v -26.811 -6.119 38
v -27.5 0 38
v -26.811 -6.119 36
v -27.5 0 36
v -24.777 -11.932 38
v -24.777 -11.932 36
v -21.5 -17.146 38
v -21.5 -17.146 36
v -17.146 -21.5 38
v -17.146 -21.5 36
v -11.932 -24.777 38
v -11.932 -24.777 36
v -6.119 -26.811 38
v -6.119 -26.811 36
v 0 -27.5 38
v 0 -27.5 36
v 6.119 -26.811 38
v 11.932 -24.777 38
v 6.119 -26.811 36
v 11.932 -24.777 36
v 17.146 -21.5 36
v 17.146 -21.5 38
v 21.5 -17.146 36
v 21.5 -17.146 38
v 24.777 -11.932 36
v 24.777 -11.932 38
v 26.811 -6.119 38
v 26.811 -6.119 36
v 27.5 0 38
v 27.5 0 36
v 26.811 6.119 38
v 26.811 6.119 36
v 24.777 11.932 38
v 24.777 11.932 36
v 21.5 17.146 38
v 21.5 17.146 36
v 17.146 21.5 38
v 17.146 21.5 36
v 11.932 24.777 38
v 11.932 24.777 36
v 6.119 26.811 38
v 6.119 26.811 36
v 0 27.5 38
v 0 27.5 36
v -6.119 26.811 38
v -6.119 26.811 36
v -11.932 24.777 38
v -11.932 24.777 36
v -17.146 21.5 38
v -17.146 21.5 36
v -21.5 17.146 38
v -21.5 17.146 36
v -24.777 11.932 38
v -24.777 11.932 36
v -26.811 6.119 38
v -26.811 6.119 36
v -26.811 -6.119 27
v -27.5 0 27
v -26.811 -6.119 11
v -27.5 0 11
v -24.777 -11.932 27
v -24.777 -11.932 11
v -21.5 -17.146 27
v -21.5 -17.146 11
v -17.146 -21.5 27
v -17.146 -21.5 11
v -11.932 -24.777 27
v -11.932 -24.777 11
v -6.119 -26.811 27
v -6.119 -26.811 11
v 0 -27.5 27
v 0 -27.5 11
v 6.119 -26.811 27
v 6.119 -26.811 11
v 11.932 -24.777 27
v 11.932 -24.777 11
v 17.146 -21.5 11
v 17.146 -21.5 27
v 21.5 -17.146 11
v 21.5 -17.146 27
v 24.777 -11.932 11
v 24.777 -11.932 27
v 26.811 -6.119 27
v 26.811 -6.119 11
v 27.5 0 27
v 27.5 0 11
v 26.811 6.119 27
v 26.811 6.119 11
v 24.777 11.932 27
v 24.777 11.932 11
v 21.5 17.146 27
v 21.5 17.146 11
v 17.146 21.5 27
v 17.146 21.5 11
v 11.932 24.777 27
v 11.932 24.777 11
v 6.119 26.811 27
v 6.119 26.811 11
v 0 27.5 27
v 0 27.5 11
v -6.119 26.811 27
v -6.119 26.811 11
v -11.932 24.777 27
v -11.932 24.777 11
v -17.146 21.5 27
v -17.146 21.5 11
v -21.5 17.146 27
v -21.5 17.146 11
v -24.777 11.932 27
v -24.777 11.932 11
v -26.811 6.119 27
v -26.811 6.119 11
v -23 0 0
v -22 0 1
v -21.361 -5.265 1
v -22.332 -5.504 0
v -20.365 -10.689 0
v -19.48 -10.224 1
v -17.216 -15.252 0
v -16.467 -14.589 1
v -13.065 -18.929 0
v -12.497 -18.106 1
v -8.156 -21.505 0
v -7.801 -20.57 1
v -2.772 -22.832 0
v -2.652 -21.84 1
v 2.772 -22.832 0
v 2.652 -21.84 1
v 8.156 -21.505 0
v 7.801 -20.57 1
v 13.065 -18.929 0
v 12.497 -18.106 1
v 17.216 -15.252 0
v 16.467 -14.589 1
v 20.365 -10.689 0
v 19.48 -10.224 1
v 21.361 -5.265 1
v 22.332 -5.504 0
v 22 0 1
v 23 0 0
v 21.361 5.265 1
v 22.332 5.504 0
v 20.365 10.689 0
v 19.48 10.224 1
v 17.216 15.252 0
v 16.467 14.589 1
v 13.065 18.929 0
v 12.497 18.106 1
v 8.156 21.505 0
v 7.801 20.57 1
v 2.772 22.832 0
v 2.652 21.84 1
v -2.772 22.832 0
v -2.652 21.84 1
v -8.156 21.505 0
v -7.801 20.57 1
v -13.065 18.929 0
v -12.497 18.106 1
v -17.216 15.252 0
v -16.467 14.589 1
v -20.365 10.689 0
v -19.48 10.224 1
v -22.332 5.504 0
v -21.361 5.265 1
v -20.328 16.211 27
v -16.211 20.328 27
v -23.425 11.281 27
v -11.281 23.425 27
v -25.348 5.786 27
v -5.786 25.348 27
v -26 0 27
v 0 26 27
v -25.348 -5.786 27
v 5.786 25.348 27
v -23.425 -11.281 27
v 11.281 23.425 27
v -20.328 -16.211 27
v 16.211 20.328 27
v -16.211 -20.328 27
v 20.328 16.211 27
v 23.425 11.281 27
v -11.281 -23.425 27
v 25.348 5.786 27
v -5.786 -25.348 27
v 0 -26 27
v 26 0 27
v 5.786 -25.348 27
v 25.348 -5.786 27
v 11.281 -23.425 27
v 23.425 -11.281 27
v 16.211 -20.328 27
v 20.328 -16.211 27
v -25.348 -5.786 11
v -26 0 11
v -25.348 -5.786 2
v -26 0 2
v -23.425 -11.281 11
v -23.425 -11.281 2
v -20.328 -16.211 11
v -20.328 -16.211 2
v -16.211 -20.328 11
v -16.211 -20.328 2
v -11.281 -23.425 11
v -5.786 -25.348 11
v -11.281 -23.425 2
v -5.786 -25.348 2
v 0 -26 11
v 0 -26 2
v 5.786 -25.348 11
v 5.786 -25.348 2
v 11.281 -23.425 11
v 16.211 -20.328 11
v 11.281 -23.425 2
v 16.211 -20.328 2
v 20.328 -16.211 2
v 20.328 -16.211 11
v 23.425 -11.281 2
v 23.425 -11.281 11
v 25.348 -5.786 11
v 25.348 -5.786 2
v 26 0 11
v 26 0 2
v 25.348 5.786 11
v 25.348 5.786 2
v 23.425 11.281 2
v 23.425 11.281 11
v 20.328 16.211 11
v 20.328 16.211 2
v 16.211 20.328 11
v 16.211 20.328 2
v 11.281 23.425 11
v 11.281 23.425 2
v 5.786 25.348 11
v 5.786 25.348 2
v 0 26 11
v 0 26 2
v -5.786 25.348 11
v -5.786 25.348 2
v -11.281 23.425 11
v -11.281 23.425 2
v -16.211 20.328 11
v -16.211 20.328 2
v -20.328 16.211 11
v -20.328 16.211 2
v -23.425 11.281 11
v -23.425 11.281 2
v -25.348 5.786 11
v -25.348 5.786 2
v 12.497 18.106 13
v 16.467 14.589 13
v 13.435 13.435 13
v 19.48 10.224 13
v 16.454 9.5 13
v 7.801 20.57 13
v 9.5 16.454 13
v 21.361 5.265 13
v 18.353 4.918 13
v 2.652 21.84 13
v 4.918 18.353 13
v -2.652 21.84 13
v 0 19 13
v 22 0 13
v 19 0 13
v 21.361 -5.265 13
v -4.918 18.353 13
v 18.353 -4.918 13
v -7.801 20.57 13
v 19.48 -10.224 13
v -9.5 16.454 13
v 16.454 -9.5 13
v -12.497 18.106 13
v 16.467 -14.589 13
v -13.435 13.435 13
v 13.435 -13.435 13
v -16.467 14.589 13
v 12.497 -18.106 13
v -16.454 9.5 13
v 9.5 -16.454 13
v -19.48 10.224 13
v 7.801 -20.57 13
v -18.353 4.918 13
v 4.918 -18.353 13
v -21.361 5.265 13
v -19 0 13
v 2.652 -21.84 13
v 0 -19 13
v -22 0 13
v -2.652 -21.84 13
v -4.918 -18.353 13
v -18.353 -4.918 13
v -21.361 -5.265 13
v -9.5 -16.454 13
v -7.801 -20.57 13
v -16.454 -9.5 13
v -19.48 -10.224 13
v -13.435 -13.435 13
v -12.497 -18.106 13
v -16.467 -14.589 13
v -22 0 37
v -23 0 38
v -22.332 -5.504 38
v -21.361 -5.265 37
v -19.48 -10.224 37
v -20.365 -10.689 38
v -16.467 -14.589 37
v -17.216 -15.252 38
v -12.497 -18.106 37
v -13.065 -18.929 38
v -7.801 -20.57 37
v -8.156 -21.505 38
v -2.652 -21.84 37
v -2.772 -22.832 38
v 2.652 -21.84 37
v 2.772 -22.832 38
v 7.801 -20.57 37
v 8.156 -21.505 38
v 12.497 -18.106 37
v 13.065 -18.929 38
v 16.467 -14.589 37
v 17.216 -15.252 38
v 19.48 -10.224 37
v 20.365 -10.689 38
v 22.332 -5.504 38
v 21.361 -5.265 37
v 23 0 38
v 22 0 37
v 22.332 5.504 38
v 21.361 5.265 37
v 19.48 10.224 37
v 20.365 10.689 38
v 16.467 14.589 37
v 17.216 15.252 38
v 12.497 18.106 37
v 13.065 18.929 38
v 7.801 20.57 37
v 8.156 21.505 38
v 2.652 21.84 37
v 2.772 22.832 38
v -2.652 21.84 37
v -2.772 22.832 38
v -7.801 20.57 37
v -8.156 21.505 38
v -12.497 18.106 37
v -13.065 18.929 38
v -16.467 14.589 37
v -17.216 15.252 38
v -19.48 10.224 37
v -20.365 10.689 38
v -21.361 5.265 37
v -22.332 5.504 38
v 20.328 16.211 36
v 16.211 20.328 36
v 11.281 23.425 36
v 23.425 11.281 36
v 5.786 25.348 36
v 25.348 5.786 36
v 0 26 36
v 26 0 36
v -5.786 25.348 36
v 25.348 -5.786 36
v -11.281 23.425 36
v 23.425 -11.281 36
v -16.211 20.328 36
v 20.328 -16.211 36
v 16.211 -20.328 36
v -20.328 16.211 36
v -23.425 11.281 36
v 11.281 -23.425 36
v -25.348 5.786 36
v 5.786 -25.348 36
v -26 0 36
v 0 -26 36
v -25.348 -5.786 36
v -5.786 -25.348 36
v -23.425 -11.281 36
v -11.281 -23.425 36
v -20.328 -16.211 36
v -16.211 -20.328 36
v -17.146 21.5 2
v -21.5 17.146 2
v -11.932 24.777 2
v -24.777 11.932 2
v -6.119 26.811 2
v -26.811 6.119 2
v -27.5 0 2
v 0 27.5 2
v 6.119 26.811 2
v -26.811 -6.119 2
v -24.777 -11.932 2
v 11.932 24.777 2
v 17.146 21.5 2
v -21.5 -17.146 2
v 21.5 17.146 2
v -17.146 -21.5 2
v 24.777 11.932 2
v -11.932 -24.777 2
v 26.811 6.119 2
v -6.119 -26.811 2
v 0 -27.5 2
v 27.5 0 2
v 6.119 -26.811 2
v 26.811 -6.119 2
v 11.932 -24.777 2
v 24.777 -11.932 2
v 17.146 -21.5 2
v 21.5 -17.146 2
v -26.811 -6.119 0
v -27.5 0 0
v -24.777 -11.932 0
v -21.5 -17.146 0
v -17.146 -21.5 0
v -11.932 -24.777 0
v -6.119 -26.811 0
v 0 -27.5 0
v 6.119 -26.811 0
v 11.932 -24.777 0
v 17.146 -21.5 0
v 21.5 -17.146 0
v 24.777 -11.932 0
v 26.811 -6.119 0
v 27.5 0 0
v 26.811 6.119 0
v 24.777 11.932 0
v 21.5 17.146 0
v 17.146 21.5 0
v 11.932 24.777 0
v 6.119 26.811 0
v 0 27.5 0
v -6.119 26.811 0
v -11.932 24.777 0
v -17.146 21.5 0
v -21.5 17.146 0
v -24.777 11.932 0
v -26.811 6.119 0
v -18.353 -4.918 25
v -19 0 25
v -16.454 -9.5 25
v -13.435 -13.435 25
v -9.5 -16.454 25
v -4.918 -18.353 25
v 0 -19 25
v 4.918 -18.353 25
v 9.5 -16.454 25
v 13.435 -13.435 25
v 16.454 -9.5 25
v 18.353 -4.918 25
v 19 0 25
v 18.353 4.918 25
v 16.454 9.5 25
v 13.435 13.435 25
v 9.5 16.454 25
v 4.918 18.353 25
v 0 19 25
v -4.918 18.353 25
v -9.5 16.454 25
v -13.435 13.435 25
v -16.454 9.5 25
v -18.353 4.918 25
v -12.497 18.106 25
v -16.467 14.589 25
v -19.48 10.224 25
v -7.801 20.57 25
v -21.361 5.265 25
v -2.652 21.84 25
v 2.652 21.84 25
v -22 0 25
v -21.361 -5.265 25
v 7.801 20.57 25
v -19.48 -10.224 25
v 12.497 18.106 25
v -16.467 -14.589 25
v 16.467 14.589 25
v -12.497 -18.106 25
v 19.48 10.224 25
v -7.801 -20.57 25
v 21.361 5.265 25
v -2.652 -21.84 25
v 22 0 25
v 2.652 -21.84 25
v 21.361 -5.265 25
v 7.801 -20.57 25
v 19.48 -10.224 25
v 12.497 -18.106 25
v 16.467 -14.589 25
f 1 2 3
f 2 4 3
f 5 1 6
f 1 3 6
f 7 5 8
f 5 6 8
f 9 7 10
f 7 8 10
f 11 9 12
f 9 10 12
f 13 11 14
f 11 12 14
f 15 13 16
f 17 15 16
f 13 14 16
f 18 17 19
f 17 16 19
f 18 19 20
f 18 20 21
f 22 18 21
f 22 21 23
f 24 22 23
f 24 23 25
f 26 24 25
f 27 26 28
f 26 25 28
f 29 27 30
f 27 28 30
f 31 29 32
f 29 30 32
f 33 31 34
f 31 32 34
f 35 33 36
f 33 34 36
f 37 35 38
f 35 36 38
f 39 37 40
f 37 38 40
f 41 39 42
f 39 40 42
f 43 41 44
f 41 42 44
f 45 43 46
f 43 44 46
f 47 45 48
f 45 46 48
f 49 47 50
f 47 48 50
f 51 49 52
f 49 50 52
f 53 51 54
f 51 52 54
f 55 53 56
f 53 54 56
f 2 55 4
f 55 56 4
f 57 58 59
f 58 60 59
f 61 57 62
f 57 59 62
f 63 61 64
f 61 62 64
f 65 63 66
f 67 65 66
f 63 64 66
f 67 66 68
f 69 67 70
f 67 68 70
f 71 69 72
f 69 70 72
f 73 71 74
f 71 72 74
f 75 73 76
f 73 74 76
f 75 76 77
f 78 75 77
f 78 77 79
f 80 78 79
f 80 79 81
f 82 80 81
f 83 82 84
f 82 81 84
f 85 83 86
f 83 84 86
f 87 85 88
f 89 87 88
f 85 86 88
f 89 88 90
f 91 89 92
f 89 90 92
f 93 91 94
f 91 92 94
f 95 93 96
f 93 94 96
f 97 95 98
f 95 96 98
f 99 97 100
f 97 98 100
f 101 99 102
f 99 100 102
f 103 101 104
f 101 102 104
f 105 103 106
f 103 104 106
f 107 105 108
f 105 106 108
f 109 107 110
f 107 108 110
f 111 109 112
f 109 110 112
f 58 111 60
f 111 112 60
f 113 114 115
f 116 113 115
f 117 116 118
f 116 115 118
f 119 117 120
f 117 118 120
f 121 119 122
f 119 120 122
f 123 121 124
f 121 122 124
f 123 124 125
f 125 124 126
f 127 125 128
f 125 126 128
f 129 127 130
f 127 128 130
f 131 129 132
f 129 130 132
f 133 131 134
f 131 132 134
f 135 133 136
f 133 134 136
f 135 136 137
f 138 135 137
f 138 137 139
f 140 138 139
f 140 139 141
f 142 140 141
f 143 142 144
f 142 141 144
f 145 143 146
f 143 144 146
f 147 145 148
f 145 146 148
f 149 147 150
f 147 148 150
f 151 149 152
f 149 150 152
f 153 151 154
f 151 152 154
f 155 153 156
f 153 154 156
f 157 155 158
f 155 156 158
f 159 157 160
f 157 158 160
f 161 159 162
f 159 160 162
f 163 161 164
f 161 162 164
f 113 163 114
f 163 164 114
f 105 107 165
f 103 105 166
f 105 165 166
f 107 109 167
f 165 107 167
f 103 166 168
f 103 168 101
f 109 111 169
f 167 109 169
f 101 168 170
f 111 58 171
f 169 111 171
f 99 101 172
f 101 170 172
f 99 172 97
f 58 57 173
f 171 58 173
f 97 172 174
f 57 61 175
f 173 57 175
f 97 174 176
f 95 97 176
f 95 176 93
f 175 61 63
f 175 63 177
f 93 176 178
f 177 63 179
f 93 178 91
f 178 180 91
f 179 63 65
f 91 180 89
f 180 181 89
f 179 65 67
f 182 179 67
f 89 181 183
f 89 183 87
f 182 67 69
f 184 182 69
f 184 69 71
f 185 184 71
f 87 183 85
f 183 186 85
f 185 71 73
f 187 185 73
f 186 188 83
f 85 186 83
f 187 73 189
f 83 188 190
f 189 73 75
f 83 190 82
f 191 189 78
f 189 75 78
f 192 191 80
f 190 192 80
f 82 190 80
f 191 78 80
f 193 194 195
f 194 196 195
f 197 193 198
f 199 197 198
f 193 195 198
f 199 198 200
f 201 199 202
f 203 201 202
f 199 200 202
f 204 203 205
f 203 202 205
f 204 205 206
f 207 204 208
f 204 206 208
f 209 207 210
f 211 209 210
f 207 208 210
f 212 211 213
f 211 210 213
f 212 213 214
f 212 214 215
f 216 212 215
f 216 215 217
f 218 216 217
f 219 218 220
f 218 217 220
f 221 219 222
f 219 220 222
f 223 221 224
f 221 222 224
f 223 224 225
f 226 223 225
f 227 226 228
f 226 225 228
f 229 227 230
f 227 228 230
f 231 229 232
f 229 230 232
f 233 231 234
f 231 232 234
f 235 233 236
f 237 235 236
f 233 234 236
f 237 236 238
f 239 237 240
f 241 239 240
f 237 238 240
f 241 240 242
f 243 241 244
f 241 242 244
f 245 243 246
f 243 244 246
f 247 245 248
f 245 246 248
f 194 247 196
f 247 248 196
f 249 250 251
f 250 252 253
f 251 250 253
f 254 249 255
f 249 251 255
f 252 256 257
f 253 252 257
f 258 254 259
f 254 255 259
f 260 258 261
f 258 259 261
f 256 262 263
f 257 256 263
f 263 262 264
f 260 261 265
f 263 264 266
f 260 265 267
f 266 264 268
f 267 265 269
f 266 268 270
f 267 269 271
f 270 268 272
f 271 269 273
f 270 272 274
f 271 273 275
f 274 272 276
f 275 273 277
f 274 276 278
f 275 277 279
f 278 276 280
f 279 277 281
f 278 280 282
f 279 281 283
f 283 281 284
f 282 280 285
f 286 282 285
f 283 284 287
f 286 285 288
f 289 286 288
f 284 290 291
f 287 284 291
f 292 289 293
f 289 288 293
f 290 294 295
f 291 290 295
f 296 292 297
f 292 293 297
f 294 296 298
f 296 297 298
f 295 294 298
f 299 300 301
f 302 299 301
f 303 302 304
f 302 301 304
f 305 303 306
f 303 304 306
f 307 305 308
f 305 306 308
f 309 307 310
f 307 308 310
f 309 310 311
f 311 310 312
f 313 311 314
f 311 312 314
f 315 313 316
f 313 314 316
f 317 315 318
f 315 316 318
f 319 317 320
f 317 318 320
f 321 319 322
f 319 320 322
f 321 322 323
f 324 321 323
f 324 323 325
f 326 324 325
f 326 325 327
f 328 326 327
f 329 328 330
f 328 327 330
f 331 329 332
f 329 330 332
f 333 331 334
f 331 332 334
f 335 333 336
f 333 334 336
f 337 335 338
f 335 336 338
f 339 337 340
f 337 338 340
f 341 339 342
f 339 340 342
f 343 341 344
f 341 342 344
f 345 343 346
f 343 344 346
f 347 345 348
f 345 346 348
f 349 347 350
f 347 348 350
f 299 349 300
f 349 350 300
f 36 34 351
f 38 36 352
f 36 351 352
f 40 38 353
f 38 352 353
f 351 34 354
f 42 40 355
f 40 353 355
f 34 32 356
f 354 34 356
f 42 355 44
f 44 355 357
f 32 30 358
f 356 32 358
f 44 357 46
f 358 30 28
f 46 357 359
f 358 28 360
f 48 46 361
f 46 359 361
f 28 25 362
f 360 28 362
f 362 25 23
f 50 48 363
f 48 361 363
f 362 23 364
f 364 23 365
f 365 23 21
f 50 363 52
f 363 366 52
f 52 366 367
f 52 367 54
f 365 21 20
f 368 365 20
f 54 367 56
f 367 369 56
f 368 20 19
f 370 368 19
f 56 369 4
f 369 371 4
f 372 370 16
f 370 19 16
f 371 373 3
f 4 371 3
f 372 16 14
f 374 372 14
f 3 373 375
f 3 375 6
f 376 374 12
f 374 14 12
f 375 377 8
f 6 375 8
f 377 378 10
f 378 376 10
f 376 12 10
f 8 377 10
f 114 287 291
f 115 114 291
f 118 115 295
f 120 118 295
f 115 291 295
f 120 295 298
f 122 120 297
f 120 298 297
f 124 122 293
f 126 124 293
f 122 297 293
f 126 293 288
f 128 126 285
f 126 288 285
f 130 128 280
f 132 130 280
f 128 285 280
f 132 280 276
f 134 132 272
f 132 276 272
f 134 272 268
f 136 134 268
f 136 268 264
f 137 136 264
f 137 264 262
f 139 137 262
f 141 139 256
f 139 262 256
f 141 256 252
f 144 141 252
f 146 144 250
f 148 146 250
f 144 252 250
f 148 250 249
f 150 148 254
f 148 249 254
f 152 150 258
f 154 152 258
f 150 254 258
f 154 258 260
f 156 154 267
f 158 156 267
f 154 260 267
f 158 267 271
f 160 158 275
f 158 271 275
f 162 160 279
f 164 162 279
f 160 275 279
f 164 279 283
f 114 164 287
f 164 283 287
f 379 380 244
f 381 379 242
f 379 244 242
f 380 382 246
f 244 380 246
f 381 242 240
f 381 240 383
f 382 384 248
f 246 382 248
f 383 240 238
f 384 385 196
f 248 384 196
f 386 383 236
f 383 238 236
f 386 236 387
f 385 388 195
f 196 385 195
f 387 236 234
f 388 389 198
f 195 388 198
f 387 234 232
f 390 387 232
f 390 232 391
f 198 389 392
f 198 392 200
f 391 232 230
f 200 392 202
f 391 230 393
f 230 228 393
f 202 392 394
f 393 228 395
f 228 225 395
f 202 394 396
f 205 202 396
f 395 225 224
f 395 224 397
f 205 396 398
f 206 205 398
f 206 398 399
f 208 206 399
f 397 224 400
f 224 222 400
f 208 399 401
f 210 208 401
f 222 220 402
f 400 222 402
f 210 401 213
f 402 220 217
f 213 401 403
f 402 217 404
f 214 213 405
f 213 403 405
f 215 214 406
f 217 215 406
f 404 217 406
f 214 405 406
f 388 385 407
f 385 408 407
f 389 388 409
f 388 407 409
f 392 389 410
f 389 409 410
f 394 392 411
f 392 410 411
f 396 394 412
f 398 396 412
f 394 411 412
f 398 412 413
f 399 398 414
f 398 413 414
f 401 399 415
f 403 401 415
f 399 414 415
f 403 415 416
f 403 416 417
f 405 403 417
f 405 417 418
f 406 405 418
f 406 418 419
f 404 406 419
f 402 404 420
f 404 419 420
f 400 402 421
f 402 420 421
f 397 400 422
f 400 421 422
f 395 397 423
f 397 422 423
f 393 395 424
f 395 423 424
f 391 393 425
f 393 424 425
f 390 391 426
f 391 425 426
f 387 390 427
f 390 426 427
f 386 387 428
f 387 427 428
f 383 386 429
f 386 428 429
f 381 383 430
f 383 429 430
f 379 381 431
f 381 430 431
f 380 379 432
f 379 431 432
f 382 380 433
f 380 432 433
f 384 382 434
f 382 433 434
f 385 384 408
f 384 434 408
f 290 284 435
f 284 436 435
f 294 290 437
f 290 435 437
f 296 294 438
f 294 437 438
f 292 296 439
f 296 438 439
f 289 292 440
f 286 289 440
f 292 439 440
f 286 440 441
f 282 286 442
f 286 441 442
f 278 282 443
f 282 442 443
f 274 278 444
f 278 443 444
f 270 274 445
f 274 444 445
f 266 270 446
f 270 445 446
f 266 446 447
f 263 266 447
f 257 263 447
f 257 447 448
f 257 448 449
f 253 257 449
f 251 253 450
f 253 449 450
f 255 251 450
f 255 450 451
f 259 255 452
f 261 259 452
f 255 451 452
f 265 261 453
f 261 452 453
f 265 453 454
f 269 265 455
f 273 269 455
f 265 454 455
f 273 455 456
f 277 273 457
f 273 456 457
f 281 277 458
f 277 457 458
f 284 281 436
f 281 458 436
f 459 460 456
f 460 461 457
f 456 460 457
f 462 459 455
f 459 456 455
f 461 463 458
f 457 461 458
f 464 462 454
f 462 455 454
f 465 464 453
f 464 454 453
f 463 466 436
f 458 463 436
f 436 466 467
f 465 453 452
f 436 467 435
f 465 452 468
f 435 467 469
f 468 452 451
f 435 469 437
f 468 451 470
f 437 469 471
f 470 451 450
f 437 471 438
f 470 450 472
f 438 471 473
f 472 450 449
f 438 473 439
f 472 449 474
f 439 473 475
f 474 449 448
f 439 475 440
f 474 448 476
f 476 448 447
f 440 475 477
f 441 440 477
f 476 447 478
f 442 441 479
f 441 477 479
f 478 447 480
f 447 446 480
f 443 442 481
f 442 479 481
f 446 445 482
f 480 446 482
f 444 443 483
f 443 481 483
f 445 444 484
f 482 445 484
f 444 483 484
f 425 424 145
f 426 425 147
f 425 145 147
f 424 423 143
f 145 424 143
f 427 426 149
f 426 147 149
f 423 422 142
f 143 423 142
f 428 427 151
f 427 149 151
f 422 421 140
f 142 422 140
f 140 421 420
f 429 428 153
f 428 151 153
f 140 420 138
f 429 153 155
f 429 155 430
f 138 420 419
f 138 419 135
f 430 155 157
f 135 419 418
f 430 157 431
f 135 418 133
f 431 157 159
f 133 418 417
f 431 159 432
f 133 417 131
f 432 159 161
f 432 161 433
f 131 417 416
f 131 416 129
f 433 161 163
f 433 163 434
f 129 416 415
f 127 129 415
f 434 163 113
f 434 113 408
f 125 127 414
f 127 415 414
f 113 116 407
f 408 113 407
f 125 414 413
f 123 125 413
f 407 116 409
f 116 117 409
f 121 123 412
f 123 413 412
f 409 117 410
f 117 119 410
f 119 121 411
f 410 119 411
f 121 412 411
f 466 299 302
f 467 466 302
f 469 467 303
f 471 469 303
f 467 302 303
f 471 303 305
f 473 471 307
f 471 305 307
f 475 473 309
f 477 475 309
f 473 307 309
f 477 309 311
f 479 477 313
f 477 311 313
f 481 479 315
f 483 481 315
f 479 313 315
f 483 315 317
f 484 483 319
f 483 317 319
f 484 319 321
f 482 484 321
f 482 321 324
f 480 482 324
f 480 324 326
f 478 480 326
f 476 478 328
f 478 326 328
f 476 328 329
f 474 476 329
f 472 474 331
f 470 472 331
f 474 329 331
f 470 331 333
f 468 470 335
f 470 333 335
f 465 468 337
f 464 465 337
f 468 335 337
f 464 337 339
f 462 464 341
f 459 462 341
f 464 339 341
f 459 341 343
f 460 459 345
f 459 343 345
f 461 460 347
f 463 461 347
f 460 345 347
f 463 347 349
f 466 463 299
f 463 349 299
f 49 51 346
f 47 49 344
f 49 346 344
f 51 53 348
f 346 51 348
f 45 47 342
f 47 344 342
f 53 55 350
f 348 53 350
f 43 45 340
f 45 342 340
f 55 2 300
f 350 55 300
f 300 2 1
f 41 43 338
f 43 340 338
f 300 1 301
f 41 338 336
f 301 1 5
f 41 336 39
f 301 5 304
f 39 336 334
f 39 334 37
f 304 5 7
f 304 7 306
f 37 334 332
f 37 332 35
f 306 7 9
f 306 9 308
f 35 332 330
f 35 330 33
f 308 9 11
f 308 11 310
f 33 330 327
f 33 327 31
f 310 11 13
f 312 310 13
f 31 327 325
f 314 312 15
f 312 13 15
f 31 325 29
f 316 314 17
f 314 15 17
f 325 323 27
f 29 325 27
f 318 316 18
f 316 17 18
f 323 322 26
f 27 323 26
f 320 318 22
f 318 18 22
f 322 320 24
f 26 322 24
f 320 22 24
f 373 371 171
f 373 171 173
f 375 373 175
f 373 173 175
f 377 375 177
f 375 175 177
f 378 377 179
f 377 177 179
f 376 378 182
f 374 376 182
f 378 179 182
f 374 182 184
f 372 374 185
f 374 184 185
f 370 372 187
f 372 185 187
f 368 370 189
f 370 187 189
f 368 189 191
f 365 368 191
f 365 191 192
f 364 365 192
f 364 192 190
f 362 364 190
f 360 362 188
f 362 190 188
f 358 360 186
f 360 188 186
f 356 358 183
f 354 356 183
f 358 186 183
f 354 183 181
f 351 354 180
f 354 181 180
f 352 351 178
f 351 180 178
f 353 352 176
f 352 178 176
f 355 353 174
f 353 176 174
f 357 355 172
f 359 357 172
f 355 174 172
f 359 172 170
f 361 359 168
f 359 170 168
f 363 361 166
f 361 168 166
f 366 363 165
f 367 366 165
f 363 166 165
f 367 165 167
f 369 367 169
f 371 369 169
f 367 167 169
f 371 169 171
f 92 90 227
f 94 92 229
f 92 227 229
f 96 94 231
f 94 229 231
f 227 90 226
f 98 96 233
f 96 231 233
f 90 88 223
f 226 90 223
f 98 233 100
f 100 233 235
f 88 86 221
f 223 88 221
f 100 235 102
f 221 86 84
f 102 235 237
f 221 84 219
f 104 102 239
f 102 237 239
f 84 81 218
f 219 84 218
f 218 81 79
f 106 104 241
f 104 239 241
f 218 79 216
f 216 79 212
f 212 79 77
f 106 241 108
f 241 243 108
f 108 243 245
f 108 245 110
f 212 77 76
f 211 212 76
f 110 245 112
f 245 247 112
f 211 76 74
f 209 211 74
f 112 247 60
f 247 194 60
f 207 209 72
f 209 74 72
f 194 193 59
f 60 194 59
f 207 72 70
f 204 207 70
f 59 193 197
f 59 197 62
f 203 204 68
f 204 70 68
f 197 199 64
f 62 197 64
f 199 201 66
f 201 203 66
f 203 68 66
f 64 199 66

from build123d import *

# Parameters (mm, degrees)
F2_SIZE = 1


with BuildPart() as f1:
    # F0 (on Front) → F1 (revolve)
    with BuildSketch(Plane.XZ):
        Polygon((-27.5, 0), (-22, 0), (-22, 13), (-19, 13), (-19, 25), (-22, 25), (-22, 38), (-27.5, 38), (-27.5, 36), (-26, 36), (-26, 27), (-27.5, 27), (-27.5, 11), (-26, 11), (-26, 2), (-27.5, 2), align=None)
    revolve(axis=Axis((0, 0, 48.059855), (0, 0, 1)))

    # F2
    f2_edges = [f1.edges().sort_by_distance(p)[0] for p in [
        (22, 0, 38),
        (22, 0, 0),
    ]]
    chamfer(f2_edges, length=F2_SIZE)


solid = f1.part
